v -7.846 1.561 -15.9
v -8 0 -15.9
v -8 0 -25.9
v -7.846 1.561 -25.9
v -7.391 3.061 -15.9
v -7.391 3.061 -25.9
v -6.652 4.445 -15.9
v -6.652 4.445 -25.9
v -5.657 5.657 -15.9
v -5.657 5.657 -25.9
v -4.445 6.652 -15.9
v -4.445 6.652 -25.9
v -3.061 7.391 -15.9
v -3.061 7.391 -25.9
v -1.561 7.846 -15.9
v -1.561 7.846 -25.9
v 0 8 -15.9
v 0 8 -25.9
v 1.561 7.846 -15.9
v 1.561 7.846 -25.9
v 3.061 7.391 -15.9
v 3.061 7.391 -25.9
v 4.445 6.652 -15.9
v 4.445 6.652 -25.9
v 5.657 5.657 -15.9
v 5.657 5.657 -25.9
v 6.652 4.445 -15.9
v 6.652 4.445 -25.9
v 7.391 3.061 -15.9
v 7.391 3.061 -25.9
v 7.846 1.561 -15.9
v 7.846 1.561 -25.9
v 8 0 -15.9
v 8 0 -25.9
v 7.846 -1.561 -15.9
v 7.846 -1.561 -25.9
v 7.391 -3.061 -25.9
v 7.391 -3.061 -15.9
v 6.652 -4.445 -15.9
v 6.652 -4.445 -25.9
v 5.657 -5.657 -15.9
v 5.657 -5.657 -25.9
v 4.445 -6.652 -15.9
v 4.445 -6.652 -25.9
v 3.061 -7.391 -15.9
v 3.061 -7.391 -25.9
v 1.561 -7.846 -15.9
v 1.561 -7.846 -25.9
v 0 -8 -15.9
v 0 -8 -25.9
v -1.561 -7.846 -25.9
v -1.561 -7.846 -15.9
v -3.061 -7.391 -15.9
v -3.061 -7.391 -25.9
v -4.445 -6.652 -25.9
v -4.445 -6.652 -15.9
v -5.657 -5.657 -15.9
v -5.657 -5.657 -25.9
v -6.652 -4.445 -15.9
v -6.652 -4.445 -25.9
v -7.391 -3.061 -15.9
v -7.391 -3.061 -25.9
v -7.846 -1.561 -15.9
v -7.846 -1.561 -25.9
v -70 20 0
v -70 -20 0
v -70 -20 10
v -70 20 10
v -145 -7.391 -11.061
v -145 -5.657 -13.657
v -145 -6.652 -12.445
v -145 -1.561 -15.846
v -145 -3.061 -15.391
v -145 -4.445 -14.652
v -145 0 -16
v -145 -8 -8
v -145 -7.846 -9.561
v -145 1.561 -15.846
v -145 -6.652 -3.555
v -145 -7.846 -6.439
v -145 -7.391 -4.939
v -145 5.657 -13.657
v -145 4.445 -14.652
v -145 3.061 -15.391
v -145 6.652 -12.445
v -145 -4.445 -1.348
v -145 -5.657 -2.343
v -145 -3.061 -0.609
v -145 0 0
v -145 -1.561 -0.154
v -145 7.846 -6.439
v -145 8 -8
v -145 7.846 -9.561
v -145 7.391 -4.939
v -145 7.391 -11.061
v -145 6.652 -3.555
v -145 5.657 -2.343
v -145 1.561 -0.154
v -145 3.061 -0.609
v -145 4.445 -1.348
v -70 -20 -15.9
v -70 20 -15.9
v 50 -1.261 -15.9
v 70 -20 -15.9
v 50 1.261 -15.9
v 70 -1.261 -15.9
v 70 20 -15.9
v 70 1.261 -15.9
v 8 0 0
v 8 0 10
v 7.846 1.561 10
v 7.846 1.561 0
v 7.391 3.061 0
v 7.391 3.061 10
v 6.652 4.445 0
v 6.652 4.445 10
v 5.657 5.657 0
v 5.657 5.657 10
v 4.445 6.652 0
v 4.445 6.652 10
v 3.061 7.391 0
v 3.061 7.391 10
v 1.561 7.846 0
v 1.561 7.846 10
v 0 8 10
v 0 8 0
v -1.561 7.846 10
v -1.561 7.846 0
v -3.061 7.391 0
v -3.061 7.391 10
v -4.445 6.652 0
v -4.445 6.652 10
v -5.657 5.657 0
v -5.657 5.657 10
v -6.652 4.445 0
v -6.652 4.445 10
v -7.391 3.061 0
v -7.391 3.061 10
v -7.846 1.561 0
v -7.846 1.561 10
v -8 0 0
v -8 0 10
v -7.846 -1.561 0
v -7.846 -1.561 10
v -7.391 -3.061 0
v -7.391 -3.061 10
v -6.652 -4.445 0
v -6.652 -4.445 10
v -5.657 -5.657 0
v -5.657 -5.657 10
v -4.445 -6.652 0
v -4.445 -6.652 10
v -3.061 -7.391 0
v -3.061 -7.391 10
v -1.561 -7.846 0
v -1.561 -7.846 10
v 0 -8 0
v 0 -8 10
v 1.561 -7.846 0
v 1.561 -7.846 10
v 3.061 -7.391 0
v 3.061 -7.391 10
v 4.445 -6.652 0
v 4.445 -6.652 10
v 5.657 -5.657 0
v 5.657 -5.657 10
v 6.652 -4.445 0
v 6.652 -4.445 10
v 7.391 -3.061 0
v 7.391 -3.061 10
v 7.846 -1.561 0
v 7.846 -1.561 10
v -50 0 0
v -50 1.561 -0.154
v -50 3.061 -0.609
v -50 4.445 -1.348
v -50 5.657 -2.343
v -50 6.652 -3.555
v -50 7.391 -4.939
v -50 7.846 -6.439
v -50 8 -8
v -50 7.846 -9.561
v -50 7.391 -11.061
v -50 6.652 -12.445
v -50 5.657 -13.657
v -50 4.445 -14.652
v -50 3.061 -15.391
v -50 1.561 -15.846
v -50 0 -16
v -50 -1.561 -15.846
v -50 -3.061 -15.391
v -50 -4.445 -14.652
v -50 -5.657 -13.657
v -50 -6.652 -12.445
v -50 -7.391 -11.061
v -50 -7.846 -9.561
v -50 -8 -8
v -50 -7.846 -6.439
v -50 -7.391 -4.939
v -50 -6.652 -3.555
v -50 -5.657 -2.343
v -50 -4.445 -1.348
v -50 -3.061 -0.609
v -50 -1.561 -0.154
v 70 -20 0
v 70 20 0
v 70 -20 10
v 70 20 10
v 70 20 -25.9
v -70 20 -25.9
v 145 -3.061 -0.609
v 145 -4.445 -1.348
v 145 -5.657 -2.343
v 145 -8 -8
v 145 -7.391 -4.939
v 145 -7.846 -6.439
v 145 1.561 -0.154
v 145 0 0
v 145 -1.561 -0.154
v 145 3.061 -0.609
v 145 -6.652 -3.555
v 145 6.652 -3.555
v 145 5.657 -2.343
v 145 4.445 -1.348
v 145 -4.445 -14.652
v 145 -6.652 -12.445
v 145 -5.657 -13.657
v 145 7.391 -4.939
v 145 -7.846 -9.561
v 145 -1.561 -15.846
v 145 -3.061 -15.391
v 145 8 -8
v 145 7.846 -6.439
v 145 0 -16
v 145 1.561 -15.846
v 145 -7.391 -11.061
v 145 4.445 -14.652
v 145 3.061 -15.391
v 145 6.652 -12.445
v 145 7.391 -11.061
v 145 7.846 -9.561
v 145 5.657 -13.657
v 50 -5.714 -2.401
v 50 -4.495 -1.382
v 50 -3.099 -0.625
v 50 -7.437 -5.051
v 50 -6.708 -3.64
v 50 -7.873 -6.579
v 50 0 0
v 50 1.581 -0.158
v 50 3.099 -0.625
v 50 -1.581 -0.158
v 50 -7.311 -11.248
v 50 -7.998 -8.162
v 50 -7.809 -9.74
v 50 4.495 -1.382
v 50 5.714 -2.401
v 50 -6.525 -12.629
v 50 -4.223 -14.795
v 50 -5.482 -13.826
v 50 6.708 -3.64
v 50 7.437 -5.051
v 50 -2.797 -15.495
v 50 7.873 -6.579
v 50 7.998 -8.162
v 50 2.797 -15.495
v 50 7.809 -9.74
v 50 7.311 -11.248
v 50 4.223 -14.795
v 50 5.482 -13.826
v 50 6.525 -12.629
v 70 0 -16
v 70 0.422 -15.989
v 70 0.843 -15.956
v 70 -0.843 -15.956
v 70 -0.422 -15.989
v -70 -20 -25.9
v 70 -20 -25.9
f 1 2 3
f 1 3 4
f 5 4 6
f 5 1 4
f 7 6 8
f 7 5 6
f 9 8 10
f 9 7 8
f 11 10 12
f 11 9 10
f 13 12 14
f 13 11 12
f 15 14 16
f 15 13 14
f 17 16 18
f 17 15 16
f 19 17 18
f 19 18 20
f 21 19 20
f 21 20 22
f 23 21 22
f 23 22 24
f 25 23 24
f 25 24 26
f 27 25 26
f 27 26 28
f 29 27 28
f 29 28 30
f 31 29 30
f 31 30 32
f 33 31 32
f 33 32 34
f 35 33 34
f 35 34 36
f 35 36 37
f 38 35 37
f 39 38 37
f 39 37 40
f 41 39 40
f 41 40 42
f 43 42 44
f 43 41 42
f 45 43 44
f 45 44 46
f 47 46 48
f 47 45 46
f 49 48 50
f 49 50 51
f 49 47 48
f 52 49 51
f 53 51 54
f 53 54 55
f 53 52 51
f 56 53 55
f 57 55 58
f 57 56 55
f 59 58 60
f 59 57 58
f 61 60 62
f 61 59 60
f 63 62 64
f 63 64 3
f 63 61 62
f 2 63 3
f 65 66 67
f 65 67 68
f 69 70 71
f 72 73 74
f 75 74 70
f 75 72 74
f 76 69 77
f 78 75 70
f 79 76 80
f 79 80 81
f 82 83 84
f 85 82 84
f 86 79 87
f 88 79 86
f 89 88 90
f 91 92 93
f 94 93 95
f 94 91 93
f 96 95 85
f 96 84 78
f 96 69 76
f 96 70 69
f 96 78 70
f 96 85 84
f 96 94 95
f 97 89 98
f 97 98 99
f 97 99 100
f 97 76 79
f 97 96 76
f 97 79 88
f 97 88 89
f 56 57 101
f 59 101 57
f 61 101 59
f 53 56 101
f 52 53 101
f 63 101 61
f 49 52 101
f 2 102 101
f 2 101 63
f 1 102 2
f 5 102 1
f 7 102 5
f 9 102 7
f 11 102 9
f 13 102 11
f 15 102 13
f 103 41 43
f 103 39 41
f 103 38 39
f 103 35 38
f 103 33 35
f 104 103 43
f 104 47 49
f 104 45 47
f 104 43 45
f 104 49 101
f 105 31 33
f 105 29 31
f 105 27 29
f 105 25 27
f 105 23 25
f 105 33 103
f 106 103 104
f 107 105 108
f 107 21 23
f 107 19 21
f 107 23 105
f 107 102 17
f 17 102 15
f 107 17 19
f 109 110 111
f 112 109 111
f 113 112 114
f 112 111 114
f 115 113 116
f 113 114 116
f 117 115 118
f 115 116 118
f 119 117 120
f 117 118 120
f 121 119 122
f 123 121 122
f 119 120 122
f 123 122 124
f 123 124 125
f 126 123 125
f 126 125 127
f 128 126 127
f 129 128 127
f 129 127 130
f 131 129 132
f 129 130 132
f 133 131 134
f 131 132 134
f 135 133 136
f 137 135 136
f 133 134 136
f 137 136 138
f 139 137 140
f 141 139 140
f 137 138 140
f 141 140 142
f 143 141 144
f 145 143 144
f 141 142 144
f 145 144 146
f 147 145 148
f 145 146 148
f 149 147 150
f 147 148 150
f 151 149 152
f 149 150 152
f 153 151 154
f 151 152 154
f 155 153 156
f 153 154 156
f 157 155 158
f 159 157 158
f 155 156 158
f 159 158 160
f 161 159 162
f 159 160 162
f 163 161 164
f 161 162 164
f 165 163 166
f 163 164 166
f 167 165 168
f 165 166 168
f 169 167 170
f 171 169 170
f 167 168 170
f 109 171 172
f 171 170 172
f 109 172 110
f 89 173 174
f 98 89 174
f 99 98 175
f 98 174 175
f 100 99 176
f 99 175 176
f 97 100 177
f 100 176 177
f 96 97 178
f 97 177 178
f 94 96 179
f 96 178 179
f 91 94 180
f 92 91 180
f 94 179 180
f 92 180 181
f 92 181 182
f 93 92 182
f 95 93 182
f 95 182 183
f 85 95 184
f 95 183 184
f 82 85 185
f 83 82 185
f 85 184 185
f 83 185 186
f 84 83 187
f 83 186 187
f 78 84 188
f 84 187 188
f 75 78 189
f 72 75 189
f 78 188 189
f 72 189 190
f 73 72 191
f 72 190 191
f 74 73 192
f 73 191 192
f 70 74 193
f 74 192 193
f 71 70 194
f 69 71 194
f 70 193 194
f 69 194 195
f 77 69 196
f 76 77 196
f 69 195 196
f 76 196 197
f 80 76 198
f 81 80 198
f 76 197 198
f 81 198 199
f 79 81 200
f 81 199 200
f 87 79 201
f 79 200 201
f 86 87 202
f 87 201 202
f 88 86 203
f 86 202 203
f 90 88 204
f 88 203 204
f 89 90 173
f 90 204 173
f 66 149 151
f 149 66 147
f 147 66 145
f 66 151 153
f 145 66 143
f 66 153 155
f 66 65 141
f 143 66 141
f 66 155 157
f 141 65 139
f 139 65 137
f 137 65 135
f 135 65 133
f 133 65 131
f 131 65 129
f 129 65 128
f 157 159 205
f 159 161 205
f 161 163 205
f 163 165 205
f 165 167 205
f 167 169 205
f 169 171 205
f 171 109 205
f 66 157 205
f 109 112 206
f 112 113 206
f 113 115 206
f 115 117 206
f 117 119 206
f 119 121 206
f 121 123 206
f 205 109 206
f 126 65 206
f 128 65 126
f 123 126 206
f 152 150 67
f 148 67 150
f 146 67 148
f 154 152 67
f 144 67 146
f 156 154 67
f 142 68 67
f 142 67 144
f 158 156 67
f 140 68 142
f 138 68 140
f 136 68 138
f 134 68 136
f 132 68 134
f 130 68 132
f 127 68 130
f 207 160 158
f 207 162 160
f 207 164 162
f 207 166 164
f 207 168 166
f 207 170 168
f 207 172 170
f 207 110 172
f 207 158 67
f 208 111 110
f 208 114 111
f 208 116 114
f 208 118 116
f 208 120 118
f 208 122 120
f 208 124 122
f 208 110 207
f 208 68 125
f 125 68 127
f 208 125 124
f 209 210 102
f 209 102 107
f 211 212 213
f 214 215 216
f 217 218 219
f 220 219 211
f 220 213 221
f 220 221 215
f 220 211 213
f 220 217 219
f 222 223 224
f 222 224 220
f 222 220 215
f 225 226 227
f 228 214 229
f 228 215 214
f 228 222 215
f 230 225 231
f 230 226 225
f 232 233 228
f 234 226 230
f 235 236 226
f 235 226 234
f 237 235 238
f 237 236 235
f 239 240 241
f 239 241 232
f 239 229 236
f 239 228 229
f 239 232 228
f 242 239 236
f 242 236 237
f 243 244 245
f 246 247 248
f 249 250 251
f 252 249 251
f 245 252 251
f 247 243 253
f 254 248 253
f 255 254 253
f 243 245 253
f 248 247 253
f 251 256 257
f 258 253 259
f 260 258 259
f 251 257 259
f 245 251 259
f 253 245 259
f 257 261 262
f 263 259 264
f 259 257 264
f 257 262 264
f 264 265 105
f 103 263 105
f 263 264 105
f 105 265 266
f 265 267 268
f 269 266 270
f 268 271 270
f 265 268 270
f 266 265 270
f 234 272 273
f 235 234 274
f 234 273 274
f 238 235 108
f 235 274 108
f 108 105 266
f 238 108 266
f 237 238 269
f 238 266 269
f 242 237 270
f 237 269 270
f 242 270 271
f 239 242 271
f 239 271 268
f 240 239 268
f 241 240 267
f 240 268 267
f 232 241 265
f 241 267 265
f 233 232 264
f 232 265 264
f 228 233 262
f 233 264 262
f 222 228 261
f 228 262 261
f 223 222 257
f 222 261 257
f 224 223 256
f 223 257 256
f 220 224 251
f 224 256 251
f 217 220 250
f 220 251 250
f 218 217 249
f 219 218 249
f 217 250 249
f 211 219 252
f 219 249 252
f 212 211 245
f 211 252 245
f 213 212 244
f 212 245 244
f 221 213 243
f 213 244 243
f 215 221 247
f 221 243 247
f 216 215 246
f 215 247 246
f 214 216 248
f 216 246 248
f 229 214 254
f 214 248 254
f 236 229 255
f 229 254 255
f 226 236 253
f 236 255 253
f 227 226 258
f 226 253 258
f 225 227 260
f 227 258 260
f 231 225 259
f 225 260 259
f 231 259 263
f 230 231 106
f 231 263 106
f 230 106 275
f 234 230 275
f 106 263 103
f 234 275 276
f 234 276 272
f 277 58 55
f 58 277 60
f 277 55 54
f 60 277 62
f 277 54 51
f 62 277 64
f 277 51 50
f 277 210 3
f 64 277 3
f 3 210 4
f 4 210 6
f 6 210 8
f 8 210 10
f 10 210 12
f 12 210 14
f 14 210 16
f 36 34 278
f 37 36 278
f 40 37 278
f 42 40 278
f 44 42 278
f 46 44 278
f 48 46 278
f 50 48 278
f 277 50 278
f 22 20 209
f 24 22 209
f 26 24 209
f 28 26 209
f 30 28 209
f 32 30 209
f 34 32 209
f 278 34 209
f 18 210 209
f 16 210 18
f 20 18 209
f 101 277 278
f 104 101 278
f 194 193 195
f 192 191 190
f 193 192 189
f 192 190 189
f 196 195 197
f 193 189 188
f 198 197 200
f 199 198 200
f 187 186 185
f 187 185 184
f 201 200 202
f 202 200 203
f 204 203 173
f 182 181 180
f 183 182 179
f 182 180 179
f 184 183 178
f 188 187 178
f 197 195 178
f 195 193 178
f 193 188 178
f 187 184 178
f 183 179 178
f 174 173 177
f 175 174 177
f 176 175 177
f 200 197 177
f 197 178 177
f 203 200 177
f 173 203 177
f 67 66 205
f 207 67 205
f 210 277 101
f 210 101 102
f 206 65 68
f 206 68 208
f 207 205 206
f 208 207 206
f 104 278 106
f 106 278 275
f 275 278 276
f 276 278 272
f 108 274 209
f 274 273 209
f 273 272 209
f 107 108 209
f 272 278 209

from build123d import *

# Parameters (mm, degrees)
SKETCH1_W                = 140
SKETCH1_H                = 40
BOSS_EXTRUDE1_DEPTH      = 10
SKETCH4_R                = 8
CUT_EXTRUDE1_DEPTH       = 10
BOSS_EXTRUDE2_DEPTH      = 75
BOSS_EXTRUDE2_DEPTH_BACK = 20
SKETCH5_R                = 8
LPATTERN1_COUNT          = 2
LPATTERN1_PITCH          = 25.9
CUT_EXTRUDE2_START       = -100
SKETCH6_R                = 8
CUT_EXTRUDE2_DEPTH       = 100
BOSS_EXTRUDE3_DEPTH      = 75
BOSS_EXTRUDE3_DEPTH_BACK = 20
SKETCH7_R                = 8


with BuildPart() as part:
    # Sketch1 → Boss-Extrude1 (new body)
    with BuildSketch(Plane.XY):
        Rectangle(SKETCH1_W, SKETCH1_H)
    boss_extrude1 = extrude(amount=BOSS_EXTRUDE1_DEPTH)

    # Sketch4 → Cut-Extrude1 (cut)
    with BuildSketch(Plane.XY.offset(10)):
        Circle(SKETCH4_R)
    extrude(amount=-CUT_EXTRUDE1_DEPTH, mode=Mode.SUBTRACT)


with BuildPart() as body_2:
    # Sketch5 → Boss-Extrude2 (new, two sides: drawn at the far end of the back side and taken through both)
    with BuildSketch(Plane(origin=(70, 0, 0), x_dir=(0, 0, -1), z_dir=(1, 0, 0)).offset(-BOSS_EXTRUDE2_DEPTH_BACK)):
        with Locations((8, 0)):
            Circle(SKETCH5_R)
    extrude(amount=BOSS_EXTRUDE2_DEPTH + BOSS_EXTRUDE2_DEPTH_BACK)

    # LPattern1: Boss-Extrude1 ×2
    with Locations(*[(0, 0, -i * LPATTERN1_PITCH) for i in range(1, LPATTERN1_COUNT)]):
        add(boss_extrude1)

    # Sketch6 → Cut-Extrude2 (cut)
    with BuildSketch(Plane(origin=(0, 0, -25.9), x_dir=(-1, 0, 0), z_dir=(0, 0, -1)).offset(CUT_EXTRUDE2_START)):
        Circle(SKETCH6_R)
    extrude(amount=CUT_EXTRUDE2_DEPTH, mode=Mode.SUBTRACT)


with BuildPart() as body_3:
    # Sketch7 → Boss-Extrude3 (new, two sides: drawn at the far end of the back side and taken through both)
    with BuildSketch(Plane.ZY.offset(70).offset(-BOSS_EXTRUDE3_DEPTH_BACK)):
        with Locations((-8, 0)):
            Circle(SKETCH7_R)
    extrude(amount=BOSS_EXTRUDE3_DEPTH + BOSS_EXTRUDE3_DEPTH_BACK)


solid = Compound([part.part, body_2.part, body_3.part])
